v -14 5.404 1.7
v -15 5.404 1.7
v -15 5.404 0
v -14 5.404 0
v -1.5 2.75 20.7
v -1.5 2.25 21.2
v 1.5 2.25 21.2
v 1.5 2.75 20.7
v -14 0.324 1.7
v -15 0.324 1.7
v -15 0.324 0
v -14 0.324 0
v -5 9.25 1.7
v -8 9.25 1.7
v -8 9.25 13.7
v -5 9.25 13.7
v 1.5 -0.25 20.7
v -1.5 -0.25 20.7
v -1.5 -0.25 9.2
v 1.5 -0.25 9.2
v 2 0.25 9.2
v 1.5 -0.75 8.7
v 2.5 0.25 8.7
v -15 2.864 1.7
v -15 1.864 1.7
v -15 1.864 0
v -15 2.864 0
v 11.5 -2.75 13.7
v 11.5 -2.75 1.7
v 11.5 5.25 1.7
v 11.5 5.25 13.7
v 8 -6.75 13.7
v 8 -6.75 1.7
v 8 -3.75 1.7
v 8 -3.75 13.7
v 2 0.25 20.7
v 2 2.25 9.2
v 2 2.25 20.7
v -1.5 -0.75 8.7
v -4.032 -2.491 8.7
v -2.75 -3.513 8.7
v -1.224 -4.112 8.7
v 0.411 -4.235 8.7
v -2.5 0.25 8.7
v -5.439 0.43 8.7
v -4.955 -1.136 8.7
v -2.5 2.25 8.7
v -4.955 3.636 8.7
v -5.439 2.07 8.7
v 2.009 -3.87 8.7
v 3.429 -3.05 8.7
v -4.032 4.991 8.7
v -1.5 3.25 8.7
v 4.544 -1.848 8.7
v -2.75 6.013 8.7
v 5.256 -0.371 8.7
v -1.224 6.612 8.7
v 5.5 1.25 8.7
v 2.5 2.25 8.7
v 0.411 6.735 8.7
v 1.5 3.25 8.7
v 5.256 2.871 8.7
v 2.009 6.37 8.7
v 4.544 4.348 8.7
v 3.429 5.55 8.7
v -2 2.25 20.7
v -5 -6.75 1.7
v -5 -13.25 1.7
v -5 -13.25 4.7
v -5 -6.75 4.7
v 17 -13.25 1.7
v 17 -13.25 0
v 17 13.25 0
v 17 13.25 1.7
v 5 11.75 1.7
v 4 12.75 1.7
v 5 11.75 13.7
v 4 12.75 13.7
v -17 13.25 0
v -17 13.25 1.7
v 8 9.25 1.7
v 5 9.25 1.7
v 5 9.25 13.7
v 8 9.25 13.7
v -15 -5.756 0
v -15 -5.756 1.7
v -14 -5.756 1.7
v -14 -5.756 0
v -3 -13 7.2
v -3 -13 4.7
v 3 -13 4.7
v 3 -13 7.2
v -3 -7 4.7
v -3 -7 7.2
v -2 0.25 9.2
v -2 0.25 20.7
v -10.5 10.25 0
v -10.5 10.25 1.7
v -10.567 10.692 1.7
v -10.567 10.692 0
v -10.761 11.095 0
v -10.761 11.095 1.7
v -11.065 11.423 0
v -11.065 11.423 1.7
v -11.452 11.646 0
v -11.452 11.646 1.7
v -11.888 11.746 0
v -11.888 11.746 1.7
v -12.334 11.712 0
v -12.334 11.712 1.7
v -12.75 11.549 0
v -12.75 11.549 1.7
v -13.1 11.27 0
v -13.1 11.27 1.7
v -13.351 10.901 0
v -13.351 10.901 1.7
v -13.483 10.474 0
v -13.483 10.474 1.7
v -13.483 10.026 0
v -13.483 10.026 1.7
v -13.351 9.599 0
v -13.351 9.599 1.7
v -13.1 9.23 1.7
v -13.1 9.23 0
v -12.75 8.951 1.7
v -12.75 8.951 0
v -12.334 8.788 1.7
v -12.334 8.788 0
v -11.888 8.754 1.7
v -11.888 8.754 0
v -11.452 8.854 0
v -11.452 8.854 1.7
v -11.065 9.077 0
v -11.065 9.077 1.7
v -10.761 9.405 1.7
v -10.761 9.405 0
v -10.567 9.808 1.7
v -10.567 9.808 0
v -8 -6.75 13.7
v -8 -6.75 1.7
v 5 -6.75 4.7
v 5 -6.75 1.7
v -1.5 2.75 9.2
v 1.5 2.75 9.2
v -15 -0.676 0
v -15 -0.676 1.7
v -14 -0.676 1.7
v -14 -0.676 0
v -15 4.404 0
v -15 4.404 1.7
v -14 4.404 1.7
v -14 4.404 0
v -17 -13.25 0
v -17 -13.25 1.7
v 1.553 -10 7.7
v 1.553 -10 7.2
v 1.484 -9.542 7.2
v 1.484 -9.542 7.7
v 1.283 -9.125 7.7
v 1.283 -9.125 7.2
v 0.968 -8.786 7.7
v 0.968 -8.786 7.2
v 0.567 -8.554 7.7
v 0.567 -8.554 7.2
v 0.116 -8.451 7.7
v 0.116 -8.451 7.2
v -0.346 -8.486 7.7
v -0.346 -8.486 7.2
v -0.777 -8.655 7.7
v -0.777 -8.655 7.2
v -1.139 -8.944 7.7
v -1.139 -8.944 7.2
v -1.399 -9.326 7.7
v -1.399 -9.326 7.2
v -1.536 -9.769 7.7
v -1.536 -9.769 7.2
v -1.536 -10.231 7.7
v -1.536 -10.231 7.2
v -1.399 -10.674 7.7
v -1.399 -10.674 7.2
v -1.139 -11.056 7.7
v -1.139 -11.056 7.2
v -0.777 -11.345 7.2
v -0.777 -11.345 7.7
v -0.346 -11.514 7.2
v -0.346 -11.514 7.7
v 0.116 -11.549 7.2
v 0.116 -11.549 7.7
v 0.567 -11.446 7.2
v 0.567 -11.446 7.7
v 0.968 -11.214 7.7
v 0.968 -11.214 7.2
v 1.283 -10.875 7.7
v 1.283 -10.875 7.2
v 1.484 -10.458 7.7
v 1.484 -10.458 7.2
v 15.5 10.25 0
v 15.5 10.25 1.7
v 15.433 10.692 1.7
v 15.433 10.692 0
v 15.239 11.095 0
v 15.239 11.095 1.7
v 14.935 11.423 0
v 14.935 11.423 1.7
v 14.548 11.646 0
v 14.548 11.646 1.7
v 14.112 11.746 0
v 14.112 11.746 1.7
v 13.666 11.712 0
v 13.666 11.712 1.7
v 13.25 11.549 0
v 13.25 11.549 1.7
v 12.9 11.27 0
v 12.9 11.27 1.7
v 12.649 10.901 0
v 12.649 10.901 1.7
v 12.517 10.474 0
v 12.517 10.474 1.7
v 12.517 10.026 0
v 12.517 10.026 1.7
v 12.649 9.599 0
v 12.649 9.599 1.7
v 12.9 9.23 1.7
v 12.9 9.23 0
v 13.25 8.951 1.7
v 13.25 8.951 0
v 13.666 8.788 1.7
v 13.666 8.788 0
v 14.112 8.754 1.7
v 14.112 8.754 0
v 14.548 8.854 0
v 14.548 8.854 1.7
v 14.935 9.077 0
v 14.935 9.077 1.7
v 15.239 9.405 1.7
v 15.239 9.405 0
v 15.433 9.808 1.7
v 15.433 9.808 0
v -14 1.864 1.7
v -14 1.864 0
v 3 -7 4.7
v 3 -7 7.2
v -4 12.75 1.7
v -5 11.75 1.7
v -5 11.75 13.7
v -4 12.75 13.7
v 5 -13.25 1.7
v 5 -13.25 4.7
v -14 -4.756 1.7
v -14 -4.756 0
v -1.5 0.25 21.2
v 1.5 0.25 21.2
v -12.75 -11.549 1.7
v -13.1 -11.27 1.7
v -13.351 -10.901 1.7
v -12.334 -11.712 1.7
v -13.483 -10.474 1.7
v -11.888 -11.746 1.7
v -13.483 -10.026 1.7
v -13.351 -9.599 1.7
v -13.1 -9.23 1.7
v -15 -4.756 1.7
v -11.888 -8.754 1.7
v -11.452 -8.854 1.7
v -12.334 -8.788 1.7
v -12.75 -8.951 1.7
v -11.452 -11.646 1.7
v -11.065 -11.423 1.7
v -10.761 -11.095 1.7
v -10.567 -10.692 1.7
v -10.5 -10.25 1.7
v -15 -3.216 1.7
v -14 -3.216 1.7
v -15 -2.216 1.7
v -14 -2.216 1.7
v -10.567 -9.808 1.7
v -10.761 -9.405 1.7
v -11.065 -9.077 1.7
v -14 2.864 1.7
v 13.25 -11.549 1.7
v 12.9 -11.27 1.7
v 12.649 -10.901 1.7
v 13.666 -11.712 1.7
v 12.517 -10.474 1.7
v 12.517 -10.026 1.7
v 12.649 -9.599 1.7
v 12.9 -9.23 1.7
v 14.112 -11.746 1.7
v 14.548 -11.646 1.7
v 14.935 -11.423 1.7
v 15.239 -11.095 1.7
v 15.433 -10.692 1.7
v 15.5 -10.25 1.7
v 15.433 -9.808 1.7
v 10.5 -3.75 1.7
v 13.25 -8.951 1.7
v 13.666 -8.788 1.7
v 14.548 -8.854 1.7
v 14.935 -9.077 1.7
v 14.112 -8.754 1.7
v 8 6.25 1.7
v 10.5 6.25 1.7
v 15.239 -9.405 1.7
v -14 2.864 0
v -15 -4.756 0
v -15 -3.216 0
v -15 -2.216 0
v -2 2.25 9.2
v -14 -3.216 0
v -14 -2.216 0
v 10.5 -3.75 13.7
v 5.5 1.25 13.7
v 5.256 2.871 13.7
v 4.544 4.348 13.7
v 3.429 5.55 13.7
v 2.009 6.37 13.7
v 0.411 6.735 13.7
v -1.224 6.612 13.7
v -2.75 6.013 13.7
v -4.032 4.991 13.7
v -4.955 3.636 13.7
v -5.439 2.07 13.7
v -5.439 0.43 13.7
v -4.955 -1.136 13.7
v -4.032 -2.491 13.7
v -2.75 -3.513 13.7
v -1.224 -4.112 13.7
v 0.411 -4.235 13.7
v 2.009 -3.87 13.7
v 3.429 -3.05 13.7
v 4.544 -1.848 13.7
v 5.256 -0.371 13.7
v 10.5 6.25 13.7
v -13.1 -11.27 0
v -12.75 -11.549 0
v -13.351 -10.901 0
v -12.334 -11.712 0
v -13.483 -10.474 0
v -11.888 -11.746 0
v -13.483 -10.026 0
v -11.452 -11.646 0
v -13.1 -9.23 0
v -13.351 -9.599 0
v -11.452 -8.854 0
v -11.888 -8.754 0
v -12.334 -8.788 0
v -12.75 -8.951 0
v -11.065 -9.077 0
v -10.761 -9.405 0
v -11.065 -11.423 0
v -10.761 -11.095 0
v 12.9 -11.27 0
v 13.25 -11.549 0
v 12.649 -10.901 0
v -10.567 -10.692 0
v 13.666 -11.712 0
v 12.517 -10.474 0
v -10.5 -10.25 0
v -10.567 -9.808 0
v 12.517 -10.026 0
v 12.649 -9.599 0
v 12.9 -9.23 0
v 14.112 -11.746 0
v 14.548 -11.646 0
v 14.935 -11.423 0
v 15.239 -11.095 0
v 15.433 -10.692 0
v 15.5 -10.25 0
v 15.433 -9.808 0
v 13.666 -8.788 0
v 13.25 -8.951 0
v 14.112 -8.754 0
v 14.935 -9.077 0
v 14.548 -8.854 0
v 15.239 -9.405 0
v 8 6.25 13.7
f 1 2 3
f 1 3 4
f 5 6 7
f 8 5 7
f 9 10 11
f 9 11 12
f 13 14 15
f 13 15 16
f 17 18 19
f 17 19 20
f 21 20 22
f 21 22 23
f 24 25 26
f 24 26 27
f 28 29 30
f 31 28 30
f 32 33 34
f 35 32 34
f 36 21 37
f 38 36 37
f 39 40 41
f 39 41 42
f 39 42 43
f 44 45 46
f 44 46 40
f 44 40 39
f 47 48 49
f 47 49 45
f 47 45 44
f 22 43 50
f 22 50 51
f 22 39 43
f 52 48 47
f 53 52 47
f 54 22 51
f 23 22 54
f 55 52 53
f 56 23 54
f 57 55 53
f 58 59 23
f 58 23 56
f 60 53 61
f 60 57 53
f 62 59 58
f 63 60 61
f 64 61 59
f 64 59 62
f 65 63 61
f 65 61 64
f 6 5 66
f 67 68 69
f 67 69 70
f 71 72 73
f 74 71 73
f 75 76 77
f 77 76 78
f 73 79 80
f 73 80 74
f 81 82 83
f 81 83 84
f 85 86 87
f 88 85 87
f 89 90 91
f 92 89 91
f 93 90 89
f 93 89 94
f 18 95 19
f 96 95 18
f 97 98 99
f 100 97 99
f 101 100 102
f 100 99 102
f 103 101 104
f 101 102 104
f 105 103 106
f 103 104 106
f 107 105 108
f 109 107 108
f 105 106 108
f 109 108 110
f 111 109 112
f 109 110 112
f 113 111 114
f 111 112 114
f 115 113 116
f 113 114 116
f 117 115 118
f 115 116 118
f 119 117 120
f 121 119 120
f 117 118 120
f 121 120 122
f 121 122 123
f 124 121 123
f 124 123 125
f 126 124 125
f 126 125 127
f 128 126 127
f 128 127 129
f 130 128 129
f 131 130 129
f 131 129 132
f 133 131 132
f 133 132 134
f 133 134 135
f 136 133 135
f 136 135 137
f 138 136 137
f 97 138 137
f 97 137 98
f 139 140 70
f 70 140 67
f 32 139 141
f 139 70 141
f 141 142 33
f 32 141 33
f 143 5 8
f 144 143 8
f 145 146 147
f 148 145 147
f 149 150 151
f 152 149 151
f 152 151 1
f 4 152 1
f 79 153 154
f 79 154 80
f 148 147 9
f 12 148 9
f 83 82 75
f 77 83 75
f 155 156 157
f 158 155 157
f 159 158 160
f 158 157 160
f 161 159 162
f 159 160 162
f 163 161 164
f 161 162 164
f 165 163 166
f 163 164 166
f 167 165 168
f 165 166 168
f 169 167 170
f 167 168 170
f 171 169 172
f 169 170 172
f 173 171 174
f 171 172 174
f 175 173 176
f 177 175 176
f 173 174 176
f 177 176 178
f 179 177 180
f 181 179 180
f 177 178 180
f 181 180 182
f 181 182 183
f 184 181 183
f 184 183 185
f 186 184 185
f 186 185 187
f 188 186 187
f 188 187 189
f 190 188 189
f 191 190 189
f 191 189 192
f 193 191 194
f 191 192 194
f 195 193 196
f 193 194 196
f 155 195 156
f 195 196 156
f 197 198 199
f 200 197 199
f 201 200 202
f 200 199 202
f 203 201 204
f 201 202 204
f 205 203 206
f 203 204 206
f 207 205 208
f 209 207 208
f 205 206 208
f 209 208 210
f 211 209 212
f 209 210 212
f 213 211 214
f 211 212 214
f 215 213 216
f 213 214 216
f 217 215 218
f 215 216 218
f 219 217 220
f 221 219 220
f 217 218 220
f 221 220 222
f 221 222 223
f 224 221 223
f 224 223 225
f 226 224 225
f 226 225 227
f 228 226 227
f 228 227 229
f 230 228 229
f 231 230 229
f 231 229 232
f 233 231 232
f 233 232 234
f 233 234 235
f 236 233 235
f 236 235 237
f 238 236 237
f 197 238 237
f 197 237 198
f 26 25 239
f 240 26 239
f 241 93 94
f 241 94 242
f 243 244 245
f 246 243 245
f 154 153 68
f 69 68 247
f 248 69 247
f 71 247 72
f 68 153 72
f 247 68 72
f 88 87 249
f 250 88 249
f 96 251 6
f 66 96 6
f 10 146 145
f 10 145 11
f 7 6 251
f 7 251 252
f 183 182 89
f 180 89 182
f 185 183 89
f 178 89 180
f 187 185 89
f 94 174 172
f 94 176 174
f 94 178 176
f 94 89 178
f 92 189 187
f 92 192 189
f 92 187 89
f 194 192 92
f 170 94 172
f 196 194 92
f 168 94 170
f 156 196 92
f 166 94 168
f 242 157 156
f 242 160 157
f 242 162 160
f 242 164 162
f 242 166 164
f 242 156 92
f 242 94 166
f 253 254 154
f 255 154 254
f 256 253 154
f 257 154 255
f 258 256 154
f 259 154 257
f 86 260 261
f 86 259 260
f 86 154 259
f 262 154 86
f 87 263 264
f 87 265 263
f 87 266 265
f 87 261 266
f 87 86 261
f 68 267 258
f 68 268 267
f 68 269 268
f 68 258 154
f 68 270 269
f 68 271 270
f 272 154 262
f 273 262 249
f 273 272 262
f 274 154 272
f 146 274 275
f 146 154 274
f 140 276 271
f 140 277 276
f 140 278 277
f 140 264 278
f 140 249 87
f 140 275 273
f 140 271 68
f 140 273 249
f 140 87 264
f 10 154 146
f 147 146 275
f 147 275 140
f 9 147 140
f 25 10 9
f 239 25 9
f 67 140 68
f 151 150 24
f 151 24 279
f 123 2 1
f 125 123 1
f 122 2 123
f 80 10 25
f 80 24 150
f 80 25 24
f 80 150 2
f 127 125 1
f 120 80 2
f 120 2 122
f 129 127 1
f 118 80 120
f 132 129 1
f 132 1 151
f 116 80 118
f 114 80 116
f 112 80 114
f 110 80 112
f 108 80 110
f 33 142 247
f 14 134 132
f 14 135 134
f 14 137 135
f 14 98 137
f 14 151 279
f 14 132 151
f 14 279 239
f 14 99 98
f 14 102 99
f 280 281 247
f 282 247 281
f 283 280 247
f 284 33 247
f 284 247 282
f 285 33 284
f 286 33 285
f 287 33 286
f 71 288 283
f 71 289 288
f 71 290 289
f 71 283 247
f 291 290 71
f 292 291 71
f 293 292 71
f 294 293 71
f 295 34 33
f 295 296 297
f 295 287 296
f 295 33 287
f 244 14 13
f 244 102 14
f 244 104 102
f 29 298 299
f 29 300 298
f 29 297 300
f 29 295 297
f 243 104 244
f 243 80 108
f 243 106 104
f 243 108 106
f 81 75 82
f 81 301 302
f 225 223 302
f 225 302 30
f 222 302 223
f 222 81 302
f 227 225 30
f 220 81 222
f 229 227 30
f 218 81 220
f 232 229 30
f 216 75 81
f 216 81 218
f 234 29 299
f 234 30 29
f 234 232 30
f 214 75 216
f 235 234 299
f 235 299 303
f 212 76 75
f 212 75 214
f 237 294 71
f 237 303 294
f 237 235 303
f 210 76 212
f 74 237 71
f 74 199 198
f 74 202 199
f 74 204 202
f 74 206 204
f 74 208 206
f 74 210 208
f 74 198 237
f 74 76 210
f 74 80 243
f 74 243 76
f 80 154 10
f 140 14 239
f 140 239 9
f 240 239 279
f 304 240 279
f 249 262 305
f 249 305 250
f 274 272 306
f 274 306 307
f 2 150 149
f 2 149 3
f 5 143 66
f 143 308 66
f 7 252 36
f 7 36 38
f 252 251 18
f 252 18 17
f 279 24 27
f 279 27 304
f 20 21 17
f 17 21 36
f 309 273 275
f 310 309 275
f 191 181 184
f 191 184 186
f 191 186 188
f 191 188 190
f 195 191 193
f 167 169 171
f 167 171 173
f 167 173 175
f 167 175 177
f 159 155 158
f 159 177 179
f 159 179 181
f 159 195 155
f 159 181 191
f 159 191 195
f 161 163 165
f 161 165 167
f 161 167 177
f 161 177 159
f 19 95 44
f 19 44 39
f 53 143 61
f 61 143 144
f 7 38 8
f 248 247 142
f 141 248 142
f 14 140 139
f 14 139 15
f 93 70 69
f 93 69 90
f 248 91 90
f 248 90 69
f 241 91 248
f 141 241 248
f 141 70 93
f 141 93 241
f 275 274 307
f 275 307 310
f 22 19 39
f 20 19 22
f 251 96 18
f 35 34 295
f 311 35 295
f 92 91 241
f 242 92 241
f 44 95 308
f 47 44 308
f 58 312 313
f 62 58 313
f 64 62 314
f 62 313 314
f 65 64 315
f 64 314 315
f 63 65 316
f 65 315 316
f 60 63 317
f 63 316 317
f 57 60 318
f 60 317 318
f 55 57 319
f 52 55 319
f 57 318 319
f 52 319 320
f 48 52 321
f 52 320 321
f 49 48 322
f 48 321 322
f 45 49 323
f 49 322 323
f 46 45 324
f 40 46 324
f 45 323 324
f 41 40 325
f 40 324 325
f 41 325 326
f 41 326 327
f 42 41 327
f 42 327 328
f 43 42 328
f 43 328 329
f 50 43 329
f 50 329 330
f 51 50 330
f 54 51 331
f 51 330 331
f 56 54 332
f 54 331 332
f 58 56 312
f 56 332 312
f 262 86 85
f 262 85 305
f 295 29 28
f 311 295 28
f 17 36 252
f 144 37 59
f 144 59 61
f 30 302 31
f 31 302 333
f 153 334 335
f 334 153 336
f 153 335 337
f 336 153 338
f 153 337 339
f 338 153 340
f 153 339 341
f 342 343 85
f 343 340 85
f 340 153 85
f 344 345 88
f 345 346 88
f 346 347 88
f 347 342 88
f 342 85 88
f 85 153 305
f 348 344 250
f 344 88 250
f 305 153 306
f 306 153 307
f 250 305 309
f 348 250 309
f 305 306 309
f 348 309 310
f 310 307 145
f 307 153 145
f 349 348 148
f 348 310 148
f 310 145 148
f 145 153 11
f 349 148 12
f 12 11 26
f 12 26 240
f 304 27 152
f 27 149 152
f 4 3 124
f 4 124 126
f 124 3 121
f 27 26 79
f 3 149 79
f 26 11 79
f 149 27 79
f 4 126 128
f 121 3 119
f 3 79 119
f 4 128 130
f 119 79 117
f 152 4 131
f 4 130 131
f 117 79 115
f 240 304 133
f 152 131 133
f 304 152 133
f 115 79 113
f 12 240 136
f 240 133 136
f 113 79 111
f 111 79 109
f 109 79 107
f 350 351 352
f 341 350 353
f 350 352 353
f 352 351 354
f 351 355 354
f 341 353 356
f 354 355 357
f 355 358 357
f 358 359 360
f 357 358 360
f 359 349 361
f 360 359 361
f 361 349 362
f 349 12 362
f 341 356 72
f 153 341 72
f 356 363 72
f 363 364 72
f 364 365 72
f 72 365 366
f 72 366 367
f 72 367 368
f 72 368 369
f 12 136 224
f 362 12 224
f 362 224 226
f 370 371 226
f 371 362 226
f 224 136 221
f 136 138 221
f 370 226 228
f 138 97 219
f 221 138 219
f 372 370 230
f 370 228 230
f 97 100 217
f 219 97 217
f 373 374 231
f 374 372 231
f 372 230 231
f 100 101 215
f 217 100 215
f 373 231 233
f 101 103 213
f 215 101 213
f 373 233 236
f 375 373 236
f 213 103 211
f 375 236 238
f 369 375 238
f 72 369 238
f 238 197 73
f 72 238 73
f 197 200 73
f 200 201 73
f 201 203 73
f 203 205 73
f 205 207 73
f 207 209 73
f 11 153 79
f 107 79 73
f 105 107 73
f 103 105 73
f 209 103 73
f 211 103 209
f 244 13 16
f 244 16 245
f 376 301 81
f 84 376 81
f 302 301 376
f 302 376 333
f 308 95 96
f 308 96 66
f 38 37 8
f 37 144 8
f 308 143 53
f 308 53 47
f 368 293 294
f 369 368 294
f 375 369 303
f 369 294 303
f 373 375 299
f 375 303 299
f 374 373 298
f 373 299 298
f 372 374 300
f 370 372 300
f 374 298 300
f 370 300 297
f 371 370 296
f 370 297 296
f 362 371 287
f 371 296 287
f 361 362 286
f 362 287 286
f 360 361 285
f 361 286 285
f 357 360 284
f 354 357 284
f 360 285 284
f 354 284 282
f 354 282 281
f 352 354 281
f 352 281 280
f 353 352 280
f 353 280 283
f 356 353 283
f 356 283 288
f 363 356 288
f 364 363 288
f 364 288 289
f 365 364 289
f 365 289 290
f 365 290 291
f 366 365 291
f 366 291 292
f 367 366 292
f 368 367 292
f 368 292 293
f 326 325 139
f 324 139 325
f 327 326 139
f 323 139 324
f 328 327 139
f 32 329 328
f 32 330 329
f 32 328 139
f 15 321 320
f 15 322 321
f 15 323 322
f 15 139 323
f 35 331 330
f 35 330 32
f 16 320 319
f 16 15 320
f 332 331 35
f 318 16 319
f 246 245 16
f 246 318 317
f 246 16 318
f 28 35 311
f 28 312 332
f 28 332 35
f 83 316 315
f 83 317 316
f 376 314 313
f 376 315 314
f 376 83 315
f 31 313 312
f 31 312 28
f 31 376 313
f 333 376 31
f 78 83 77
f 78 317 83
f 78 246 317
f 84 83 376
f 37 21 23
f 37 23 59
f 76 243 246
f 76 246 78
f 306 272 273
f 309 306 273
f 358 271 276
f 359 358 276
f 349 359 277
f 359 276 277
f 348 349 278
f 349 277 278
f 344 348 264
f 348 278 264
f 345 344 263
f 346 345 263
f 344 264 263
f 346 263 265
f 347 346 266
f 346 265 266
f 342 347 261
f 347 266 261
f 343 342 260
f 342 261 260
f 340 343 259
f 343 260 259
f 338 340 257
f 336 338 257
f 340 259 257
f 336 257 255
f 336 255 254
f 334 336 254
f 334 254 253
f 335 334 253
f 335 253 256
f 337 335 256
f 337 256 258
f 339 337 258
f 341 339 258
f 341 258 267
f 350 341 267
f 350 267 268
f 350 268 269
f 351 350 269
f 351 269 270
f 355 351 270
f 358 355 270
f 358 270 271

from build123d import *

# Parameters (mm, degrees)
SKETCH_1_W          = 34
SKETCH_1_H          = 26.5
EXTRUDE_1_DEPTH     = 1.7
SKETCH_2_W          = 16
SKETCH_2_H          = 16
EXTRUDE_2_DEPTH     = 12
SKETCH_3_W          = 10
SKETCH_3_H          = 6.5
EXTRUDE_3_DEPTH     = 3
SKETCH_4_W          = 6
SKETCH_4_H          = 6
EXTRUDE_4_DEPTH     = 2.5
SKETCH_5_R          = 1.553190153
EXTRUDE_5_DEPTH     = 0.5
SKETCH_6_W          = 10
SKETCH_6_H          = 3.5
SKETCH_6_W_2        = 3.5
SKETCH_6_H_2        = 10
EXTRUDE_6_DEPTH     = 12
CHAMFER_1_SIZE      = 1
SKETCH_7_R          = 5.5
CUT_EXTRUDE_1_DEPTH = 5
SKETCH_8_W          = 4
SKETCH_8_H          = 3
EXTRUDE_7_DEPTH     = 12.5
CHAMFER_2_SIZE      = 0.5
SKETCH_9_R          = 1.5
CUT_EXTRUDE_2_DEPTH = 30.065658431
SKETCH_10_W         = 1
SKETCH_10_H         = 1
CUT_EXTRUDE_3_DEPTH = 30.065658431


with BuildPart() as part:
    # Эскиз1 → Бобышка-Вытянуть1 (new body)
    with BuildSketch(Plane.XY):
        Rectangle(SKETCH_1_W, SKETCH_1_H)
    extrude(amount=EXTRUDE_1_DEPTH)

    # Эскиз2 → Бобышка-Вытянуть2 (add)
    with BuildSketch(Plane.XY.offset(1.7)):
        with Locations((0, 1.25)):
            Rectangle(SKETCH_2_W, SKETCH_2_H)
    extrude(amount=EXTRUDE_2_DEPTH)

    # Эскиз3 → Бобышка-Вытянуть3 (add)
    with BuildSketch(Plane.XY.offset(1.7)):
        with Locations((0, -10)):
            Rectangle(SKETCH_3_W, SKETCH_3_H)
    extrude(amount=EXTRUDE_3_DEPTH)

    # Эскиз4 → Бобышка-Вытянуть4 (add)
    with BuildSketch(Plane.XY.offset(4.7)):
        with Locations((0, -10)):
            Rectangle(SKETCH_4_W, SKETCH_4_H)
    extrude(amount=EXTRUDE_4_DEPTH)

    # Эскиз5 → Бобышка-Вытянуть5 (add)
    with BuildSketch(Plane.XY.offset(7.2)):
        with Locations((0, -10)):
            Circle(SKETCH_5_R)
    extrude(amount=EXTRUDE_5_DEPTH)

    # Эскиз6 → Бобышка-Вытянуть6 (add)
    with BuildSketch(Plane.XY.offset(1.7)):
        with Locations((0, 11)):
            Rectangle(SKETCH_6_W, SKETCH_6_H)
        with Locations((9.75, 1.25)):
            Rectangle(SKETCH_6_W_2, SKETCH_6_H_2)
    extrude(amount=EXTRUDE_6_DEPTH)

    # Фаска1
    chamfer_1_edges = [part.edges().sort_by_distance(p)[0] for p in [
        (5, 12.75, 7.7),
        (-5, 12.75, 7.7),
        (11.5, -3.75, 7.7),
        (11.5, 6.25, 7.7),
    ]]
    chamfer(chamfer_1_edges, length=CHAMFER_1_SIZE)

    # Эскиз7 → Вырез-Вытянуть1 (cut)
    with BuildSketch(Plane.XY.offset(13.7)):
        with Locations((0, 1.25)):
            Circle(SKETCH_7_R)
    extrude(amount=-CUT_EXTRUDE_1_DEPTH, mode=Mode.SUBTRACT)

    # Эскиз8 → Бобышка-Вытянуть7 (add)
    with BuildSketch(Plane.XY.offset(8.7)):
        with Locations((0, 1.25)):
            Rectangle(SKETCH_8_W, SKETCH_8_H)
    extrude(amount=EXTRUDE_7_DEPTH)

    # Фаска2
    chamfer_2_edges = [part.edges().sort_by_distance(p)[0] for p in [
        (2, 1.25, 8.7),
        (2, -0.25, 14.95),
        (0, 2.75, 8.7),
        (2, 2.75, 14.95),
        (-2, 1.25, 8.7),
        (-2, 2.75, 14.95),
        (0, -0.25, 8.7),
        (-2, -0.25, 14.95),
        (2, 1.25, 21.2),
        (0, 2.75, 21.2),
        (-2, 1.25, 21.2),
        (0, -0.25, 21.2),
    ]]
    chamfer(chamfer_2_edges, length=CHAMFER_2_SIZE)

    # Эскиз9 → Вырез-Вытянуть2 (cut, through all)
    with BuildSketch(Plane.XY.offset(1.7)):
        with Locations((14, 10.25)):
            Circle(SKETCH_9_R)
        with Locations((14, -10.25)):
            Circle(SKETCH_9_R)
        with Locations((-12, 10.25)):
            Circle(SKETCH_9_R)
        with Locations((-12, -10.25)):
            Circle(SKETCH_9_R)
    extrude(amount=-CUT_EXTRUDE_2_DEPTH, mode=Mode.SUBTRACT)

    # Эскиз10 → Вырез-Вытянуть3 (cut, through all)
    with BuildSketch(Plane.XY.offset(1.7)):
        with Locations((-14.5, 2.364432177)):
            Rectangle(SKETCH_10_W, SKETCH_10_H)
        with Locations((-14.5, 4.904432177)):
            Rectangle(SKETCH_10_W, SKETCH_10_H)
        with Locations((-14.5, -0.175567823)):
            Rectangle(SKETCH_10_W, SKETCH_10_H)
        with Locations((-14.5, -2.715567823)):
            Rectangle(SKETCH_10_W, SKETCH_10_H)
        with Locations((-14.5, -5.255567823)):
            Rectangle(SKETCH_10_W, SKETCH_10_H)
    extrude(amount=-CUT_EXTRUDE_3_DEPTH, mode=Mode.SUBTRACT)


solid = part.part
